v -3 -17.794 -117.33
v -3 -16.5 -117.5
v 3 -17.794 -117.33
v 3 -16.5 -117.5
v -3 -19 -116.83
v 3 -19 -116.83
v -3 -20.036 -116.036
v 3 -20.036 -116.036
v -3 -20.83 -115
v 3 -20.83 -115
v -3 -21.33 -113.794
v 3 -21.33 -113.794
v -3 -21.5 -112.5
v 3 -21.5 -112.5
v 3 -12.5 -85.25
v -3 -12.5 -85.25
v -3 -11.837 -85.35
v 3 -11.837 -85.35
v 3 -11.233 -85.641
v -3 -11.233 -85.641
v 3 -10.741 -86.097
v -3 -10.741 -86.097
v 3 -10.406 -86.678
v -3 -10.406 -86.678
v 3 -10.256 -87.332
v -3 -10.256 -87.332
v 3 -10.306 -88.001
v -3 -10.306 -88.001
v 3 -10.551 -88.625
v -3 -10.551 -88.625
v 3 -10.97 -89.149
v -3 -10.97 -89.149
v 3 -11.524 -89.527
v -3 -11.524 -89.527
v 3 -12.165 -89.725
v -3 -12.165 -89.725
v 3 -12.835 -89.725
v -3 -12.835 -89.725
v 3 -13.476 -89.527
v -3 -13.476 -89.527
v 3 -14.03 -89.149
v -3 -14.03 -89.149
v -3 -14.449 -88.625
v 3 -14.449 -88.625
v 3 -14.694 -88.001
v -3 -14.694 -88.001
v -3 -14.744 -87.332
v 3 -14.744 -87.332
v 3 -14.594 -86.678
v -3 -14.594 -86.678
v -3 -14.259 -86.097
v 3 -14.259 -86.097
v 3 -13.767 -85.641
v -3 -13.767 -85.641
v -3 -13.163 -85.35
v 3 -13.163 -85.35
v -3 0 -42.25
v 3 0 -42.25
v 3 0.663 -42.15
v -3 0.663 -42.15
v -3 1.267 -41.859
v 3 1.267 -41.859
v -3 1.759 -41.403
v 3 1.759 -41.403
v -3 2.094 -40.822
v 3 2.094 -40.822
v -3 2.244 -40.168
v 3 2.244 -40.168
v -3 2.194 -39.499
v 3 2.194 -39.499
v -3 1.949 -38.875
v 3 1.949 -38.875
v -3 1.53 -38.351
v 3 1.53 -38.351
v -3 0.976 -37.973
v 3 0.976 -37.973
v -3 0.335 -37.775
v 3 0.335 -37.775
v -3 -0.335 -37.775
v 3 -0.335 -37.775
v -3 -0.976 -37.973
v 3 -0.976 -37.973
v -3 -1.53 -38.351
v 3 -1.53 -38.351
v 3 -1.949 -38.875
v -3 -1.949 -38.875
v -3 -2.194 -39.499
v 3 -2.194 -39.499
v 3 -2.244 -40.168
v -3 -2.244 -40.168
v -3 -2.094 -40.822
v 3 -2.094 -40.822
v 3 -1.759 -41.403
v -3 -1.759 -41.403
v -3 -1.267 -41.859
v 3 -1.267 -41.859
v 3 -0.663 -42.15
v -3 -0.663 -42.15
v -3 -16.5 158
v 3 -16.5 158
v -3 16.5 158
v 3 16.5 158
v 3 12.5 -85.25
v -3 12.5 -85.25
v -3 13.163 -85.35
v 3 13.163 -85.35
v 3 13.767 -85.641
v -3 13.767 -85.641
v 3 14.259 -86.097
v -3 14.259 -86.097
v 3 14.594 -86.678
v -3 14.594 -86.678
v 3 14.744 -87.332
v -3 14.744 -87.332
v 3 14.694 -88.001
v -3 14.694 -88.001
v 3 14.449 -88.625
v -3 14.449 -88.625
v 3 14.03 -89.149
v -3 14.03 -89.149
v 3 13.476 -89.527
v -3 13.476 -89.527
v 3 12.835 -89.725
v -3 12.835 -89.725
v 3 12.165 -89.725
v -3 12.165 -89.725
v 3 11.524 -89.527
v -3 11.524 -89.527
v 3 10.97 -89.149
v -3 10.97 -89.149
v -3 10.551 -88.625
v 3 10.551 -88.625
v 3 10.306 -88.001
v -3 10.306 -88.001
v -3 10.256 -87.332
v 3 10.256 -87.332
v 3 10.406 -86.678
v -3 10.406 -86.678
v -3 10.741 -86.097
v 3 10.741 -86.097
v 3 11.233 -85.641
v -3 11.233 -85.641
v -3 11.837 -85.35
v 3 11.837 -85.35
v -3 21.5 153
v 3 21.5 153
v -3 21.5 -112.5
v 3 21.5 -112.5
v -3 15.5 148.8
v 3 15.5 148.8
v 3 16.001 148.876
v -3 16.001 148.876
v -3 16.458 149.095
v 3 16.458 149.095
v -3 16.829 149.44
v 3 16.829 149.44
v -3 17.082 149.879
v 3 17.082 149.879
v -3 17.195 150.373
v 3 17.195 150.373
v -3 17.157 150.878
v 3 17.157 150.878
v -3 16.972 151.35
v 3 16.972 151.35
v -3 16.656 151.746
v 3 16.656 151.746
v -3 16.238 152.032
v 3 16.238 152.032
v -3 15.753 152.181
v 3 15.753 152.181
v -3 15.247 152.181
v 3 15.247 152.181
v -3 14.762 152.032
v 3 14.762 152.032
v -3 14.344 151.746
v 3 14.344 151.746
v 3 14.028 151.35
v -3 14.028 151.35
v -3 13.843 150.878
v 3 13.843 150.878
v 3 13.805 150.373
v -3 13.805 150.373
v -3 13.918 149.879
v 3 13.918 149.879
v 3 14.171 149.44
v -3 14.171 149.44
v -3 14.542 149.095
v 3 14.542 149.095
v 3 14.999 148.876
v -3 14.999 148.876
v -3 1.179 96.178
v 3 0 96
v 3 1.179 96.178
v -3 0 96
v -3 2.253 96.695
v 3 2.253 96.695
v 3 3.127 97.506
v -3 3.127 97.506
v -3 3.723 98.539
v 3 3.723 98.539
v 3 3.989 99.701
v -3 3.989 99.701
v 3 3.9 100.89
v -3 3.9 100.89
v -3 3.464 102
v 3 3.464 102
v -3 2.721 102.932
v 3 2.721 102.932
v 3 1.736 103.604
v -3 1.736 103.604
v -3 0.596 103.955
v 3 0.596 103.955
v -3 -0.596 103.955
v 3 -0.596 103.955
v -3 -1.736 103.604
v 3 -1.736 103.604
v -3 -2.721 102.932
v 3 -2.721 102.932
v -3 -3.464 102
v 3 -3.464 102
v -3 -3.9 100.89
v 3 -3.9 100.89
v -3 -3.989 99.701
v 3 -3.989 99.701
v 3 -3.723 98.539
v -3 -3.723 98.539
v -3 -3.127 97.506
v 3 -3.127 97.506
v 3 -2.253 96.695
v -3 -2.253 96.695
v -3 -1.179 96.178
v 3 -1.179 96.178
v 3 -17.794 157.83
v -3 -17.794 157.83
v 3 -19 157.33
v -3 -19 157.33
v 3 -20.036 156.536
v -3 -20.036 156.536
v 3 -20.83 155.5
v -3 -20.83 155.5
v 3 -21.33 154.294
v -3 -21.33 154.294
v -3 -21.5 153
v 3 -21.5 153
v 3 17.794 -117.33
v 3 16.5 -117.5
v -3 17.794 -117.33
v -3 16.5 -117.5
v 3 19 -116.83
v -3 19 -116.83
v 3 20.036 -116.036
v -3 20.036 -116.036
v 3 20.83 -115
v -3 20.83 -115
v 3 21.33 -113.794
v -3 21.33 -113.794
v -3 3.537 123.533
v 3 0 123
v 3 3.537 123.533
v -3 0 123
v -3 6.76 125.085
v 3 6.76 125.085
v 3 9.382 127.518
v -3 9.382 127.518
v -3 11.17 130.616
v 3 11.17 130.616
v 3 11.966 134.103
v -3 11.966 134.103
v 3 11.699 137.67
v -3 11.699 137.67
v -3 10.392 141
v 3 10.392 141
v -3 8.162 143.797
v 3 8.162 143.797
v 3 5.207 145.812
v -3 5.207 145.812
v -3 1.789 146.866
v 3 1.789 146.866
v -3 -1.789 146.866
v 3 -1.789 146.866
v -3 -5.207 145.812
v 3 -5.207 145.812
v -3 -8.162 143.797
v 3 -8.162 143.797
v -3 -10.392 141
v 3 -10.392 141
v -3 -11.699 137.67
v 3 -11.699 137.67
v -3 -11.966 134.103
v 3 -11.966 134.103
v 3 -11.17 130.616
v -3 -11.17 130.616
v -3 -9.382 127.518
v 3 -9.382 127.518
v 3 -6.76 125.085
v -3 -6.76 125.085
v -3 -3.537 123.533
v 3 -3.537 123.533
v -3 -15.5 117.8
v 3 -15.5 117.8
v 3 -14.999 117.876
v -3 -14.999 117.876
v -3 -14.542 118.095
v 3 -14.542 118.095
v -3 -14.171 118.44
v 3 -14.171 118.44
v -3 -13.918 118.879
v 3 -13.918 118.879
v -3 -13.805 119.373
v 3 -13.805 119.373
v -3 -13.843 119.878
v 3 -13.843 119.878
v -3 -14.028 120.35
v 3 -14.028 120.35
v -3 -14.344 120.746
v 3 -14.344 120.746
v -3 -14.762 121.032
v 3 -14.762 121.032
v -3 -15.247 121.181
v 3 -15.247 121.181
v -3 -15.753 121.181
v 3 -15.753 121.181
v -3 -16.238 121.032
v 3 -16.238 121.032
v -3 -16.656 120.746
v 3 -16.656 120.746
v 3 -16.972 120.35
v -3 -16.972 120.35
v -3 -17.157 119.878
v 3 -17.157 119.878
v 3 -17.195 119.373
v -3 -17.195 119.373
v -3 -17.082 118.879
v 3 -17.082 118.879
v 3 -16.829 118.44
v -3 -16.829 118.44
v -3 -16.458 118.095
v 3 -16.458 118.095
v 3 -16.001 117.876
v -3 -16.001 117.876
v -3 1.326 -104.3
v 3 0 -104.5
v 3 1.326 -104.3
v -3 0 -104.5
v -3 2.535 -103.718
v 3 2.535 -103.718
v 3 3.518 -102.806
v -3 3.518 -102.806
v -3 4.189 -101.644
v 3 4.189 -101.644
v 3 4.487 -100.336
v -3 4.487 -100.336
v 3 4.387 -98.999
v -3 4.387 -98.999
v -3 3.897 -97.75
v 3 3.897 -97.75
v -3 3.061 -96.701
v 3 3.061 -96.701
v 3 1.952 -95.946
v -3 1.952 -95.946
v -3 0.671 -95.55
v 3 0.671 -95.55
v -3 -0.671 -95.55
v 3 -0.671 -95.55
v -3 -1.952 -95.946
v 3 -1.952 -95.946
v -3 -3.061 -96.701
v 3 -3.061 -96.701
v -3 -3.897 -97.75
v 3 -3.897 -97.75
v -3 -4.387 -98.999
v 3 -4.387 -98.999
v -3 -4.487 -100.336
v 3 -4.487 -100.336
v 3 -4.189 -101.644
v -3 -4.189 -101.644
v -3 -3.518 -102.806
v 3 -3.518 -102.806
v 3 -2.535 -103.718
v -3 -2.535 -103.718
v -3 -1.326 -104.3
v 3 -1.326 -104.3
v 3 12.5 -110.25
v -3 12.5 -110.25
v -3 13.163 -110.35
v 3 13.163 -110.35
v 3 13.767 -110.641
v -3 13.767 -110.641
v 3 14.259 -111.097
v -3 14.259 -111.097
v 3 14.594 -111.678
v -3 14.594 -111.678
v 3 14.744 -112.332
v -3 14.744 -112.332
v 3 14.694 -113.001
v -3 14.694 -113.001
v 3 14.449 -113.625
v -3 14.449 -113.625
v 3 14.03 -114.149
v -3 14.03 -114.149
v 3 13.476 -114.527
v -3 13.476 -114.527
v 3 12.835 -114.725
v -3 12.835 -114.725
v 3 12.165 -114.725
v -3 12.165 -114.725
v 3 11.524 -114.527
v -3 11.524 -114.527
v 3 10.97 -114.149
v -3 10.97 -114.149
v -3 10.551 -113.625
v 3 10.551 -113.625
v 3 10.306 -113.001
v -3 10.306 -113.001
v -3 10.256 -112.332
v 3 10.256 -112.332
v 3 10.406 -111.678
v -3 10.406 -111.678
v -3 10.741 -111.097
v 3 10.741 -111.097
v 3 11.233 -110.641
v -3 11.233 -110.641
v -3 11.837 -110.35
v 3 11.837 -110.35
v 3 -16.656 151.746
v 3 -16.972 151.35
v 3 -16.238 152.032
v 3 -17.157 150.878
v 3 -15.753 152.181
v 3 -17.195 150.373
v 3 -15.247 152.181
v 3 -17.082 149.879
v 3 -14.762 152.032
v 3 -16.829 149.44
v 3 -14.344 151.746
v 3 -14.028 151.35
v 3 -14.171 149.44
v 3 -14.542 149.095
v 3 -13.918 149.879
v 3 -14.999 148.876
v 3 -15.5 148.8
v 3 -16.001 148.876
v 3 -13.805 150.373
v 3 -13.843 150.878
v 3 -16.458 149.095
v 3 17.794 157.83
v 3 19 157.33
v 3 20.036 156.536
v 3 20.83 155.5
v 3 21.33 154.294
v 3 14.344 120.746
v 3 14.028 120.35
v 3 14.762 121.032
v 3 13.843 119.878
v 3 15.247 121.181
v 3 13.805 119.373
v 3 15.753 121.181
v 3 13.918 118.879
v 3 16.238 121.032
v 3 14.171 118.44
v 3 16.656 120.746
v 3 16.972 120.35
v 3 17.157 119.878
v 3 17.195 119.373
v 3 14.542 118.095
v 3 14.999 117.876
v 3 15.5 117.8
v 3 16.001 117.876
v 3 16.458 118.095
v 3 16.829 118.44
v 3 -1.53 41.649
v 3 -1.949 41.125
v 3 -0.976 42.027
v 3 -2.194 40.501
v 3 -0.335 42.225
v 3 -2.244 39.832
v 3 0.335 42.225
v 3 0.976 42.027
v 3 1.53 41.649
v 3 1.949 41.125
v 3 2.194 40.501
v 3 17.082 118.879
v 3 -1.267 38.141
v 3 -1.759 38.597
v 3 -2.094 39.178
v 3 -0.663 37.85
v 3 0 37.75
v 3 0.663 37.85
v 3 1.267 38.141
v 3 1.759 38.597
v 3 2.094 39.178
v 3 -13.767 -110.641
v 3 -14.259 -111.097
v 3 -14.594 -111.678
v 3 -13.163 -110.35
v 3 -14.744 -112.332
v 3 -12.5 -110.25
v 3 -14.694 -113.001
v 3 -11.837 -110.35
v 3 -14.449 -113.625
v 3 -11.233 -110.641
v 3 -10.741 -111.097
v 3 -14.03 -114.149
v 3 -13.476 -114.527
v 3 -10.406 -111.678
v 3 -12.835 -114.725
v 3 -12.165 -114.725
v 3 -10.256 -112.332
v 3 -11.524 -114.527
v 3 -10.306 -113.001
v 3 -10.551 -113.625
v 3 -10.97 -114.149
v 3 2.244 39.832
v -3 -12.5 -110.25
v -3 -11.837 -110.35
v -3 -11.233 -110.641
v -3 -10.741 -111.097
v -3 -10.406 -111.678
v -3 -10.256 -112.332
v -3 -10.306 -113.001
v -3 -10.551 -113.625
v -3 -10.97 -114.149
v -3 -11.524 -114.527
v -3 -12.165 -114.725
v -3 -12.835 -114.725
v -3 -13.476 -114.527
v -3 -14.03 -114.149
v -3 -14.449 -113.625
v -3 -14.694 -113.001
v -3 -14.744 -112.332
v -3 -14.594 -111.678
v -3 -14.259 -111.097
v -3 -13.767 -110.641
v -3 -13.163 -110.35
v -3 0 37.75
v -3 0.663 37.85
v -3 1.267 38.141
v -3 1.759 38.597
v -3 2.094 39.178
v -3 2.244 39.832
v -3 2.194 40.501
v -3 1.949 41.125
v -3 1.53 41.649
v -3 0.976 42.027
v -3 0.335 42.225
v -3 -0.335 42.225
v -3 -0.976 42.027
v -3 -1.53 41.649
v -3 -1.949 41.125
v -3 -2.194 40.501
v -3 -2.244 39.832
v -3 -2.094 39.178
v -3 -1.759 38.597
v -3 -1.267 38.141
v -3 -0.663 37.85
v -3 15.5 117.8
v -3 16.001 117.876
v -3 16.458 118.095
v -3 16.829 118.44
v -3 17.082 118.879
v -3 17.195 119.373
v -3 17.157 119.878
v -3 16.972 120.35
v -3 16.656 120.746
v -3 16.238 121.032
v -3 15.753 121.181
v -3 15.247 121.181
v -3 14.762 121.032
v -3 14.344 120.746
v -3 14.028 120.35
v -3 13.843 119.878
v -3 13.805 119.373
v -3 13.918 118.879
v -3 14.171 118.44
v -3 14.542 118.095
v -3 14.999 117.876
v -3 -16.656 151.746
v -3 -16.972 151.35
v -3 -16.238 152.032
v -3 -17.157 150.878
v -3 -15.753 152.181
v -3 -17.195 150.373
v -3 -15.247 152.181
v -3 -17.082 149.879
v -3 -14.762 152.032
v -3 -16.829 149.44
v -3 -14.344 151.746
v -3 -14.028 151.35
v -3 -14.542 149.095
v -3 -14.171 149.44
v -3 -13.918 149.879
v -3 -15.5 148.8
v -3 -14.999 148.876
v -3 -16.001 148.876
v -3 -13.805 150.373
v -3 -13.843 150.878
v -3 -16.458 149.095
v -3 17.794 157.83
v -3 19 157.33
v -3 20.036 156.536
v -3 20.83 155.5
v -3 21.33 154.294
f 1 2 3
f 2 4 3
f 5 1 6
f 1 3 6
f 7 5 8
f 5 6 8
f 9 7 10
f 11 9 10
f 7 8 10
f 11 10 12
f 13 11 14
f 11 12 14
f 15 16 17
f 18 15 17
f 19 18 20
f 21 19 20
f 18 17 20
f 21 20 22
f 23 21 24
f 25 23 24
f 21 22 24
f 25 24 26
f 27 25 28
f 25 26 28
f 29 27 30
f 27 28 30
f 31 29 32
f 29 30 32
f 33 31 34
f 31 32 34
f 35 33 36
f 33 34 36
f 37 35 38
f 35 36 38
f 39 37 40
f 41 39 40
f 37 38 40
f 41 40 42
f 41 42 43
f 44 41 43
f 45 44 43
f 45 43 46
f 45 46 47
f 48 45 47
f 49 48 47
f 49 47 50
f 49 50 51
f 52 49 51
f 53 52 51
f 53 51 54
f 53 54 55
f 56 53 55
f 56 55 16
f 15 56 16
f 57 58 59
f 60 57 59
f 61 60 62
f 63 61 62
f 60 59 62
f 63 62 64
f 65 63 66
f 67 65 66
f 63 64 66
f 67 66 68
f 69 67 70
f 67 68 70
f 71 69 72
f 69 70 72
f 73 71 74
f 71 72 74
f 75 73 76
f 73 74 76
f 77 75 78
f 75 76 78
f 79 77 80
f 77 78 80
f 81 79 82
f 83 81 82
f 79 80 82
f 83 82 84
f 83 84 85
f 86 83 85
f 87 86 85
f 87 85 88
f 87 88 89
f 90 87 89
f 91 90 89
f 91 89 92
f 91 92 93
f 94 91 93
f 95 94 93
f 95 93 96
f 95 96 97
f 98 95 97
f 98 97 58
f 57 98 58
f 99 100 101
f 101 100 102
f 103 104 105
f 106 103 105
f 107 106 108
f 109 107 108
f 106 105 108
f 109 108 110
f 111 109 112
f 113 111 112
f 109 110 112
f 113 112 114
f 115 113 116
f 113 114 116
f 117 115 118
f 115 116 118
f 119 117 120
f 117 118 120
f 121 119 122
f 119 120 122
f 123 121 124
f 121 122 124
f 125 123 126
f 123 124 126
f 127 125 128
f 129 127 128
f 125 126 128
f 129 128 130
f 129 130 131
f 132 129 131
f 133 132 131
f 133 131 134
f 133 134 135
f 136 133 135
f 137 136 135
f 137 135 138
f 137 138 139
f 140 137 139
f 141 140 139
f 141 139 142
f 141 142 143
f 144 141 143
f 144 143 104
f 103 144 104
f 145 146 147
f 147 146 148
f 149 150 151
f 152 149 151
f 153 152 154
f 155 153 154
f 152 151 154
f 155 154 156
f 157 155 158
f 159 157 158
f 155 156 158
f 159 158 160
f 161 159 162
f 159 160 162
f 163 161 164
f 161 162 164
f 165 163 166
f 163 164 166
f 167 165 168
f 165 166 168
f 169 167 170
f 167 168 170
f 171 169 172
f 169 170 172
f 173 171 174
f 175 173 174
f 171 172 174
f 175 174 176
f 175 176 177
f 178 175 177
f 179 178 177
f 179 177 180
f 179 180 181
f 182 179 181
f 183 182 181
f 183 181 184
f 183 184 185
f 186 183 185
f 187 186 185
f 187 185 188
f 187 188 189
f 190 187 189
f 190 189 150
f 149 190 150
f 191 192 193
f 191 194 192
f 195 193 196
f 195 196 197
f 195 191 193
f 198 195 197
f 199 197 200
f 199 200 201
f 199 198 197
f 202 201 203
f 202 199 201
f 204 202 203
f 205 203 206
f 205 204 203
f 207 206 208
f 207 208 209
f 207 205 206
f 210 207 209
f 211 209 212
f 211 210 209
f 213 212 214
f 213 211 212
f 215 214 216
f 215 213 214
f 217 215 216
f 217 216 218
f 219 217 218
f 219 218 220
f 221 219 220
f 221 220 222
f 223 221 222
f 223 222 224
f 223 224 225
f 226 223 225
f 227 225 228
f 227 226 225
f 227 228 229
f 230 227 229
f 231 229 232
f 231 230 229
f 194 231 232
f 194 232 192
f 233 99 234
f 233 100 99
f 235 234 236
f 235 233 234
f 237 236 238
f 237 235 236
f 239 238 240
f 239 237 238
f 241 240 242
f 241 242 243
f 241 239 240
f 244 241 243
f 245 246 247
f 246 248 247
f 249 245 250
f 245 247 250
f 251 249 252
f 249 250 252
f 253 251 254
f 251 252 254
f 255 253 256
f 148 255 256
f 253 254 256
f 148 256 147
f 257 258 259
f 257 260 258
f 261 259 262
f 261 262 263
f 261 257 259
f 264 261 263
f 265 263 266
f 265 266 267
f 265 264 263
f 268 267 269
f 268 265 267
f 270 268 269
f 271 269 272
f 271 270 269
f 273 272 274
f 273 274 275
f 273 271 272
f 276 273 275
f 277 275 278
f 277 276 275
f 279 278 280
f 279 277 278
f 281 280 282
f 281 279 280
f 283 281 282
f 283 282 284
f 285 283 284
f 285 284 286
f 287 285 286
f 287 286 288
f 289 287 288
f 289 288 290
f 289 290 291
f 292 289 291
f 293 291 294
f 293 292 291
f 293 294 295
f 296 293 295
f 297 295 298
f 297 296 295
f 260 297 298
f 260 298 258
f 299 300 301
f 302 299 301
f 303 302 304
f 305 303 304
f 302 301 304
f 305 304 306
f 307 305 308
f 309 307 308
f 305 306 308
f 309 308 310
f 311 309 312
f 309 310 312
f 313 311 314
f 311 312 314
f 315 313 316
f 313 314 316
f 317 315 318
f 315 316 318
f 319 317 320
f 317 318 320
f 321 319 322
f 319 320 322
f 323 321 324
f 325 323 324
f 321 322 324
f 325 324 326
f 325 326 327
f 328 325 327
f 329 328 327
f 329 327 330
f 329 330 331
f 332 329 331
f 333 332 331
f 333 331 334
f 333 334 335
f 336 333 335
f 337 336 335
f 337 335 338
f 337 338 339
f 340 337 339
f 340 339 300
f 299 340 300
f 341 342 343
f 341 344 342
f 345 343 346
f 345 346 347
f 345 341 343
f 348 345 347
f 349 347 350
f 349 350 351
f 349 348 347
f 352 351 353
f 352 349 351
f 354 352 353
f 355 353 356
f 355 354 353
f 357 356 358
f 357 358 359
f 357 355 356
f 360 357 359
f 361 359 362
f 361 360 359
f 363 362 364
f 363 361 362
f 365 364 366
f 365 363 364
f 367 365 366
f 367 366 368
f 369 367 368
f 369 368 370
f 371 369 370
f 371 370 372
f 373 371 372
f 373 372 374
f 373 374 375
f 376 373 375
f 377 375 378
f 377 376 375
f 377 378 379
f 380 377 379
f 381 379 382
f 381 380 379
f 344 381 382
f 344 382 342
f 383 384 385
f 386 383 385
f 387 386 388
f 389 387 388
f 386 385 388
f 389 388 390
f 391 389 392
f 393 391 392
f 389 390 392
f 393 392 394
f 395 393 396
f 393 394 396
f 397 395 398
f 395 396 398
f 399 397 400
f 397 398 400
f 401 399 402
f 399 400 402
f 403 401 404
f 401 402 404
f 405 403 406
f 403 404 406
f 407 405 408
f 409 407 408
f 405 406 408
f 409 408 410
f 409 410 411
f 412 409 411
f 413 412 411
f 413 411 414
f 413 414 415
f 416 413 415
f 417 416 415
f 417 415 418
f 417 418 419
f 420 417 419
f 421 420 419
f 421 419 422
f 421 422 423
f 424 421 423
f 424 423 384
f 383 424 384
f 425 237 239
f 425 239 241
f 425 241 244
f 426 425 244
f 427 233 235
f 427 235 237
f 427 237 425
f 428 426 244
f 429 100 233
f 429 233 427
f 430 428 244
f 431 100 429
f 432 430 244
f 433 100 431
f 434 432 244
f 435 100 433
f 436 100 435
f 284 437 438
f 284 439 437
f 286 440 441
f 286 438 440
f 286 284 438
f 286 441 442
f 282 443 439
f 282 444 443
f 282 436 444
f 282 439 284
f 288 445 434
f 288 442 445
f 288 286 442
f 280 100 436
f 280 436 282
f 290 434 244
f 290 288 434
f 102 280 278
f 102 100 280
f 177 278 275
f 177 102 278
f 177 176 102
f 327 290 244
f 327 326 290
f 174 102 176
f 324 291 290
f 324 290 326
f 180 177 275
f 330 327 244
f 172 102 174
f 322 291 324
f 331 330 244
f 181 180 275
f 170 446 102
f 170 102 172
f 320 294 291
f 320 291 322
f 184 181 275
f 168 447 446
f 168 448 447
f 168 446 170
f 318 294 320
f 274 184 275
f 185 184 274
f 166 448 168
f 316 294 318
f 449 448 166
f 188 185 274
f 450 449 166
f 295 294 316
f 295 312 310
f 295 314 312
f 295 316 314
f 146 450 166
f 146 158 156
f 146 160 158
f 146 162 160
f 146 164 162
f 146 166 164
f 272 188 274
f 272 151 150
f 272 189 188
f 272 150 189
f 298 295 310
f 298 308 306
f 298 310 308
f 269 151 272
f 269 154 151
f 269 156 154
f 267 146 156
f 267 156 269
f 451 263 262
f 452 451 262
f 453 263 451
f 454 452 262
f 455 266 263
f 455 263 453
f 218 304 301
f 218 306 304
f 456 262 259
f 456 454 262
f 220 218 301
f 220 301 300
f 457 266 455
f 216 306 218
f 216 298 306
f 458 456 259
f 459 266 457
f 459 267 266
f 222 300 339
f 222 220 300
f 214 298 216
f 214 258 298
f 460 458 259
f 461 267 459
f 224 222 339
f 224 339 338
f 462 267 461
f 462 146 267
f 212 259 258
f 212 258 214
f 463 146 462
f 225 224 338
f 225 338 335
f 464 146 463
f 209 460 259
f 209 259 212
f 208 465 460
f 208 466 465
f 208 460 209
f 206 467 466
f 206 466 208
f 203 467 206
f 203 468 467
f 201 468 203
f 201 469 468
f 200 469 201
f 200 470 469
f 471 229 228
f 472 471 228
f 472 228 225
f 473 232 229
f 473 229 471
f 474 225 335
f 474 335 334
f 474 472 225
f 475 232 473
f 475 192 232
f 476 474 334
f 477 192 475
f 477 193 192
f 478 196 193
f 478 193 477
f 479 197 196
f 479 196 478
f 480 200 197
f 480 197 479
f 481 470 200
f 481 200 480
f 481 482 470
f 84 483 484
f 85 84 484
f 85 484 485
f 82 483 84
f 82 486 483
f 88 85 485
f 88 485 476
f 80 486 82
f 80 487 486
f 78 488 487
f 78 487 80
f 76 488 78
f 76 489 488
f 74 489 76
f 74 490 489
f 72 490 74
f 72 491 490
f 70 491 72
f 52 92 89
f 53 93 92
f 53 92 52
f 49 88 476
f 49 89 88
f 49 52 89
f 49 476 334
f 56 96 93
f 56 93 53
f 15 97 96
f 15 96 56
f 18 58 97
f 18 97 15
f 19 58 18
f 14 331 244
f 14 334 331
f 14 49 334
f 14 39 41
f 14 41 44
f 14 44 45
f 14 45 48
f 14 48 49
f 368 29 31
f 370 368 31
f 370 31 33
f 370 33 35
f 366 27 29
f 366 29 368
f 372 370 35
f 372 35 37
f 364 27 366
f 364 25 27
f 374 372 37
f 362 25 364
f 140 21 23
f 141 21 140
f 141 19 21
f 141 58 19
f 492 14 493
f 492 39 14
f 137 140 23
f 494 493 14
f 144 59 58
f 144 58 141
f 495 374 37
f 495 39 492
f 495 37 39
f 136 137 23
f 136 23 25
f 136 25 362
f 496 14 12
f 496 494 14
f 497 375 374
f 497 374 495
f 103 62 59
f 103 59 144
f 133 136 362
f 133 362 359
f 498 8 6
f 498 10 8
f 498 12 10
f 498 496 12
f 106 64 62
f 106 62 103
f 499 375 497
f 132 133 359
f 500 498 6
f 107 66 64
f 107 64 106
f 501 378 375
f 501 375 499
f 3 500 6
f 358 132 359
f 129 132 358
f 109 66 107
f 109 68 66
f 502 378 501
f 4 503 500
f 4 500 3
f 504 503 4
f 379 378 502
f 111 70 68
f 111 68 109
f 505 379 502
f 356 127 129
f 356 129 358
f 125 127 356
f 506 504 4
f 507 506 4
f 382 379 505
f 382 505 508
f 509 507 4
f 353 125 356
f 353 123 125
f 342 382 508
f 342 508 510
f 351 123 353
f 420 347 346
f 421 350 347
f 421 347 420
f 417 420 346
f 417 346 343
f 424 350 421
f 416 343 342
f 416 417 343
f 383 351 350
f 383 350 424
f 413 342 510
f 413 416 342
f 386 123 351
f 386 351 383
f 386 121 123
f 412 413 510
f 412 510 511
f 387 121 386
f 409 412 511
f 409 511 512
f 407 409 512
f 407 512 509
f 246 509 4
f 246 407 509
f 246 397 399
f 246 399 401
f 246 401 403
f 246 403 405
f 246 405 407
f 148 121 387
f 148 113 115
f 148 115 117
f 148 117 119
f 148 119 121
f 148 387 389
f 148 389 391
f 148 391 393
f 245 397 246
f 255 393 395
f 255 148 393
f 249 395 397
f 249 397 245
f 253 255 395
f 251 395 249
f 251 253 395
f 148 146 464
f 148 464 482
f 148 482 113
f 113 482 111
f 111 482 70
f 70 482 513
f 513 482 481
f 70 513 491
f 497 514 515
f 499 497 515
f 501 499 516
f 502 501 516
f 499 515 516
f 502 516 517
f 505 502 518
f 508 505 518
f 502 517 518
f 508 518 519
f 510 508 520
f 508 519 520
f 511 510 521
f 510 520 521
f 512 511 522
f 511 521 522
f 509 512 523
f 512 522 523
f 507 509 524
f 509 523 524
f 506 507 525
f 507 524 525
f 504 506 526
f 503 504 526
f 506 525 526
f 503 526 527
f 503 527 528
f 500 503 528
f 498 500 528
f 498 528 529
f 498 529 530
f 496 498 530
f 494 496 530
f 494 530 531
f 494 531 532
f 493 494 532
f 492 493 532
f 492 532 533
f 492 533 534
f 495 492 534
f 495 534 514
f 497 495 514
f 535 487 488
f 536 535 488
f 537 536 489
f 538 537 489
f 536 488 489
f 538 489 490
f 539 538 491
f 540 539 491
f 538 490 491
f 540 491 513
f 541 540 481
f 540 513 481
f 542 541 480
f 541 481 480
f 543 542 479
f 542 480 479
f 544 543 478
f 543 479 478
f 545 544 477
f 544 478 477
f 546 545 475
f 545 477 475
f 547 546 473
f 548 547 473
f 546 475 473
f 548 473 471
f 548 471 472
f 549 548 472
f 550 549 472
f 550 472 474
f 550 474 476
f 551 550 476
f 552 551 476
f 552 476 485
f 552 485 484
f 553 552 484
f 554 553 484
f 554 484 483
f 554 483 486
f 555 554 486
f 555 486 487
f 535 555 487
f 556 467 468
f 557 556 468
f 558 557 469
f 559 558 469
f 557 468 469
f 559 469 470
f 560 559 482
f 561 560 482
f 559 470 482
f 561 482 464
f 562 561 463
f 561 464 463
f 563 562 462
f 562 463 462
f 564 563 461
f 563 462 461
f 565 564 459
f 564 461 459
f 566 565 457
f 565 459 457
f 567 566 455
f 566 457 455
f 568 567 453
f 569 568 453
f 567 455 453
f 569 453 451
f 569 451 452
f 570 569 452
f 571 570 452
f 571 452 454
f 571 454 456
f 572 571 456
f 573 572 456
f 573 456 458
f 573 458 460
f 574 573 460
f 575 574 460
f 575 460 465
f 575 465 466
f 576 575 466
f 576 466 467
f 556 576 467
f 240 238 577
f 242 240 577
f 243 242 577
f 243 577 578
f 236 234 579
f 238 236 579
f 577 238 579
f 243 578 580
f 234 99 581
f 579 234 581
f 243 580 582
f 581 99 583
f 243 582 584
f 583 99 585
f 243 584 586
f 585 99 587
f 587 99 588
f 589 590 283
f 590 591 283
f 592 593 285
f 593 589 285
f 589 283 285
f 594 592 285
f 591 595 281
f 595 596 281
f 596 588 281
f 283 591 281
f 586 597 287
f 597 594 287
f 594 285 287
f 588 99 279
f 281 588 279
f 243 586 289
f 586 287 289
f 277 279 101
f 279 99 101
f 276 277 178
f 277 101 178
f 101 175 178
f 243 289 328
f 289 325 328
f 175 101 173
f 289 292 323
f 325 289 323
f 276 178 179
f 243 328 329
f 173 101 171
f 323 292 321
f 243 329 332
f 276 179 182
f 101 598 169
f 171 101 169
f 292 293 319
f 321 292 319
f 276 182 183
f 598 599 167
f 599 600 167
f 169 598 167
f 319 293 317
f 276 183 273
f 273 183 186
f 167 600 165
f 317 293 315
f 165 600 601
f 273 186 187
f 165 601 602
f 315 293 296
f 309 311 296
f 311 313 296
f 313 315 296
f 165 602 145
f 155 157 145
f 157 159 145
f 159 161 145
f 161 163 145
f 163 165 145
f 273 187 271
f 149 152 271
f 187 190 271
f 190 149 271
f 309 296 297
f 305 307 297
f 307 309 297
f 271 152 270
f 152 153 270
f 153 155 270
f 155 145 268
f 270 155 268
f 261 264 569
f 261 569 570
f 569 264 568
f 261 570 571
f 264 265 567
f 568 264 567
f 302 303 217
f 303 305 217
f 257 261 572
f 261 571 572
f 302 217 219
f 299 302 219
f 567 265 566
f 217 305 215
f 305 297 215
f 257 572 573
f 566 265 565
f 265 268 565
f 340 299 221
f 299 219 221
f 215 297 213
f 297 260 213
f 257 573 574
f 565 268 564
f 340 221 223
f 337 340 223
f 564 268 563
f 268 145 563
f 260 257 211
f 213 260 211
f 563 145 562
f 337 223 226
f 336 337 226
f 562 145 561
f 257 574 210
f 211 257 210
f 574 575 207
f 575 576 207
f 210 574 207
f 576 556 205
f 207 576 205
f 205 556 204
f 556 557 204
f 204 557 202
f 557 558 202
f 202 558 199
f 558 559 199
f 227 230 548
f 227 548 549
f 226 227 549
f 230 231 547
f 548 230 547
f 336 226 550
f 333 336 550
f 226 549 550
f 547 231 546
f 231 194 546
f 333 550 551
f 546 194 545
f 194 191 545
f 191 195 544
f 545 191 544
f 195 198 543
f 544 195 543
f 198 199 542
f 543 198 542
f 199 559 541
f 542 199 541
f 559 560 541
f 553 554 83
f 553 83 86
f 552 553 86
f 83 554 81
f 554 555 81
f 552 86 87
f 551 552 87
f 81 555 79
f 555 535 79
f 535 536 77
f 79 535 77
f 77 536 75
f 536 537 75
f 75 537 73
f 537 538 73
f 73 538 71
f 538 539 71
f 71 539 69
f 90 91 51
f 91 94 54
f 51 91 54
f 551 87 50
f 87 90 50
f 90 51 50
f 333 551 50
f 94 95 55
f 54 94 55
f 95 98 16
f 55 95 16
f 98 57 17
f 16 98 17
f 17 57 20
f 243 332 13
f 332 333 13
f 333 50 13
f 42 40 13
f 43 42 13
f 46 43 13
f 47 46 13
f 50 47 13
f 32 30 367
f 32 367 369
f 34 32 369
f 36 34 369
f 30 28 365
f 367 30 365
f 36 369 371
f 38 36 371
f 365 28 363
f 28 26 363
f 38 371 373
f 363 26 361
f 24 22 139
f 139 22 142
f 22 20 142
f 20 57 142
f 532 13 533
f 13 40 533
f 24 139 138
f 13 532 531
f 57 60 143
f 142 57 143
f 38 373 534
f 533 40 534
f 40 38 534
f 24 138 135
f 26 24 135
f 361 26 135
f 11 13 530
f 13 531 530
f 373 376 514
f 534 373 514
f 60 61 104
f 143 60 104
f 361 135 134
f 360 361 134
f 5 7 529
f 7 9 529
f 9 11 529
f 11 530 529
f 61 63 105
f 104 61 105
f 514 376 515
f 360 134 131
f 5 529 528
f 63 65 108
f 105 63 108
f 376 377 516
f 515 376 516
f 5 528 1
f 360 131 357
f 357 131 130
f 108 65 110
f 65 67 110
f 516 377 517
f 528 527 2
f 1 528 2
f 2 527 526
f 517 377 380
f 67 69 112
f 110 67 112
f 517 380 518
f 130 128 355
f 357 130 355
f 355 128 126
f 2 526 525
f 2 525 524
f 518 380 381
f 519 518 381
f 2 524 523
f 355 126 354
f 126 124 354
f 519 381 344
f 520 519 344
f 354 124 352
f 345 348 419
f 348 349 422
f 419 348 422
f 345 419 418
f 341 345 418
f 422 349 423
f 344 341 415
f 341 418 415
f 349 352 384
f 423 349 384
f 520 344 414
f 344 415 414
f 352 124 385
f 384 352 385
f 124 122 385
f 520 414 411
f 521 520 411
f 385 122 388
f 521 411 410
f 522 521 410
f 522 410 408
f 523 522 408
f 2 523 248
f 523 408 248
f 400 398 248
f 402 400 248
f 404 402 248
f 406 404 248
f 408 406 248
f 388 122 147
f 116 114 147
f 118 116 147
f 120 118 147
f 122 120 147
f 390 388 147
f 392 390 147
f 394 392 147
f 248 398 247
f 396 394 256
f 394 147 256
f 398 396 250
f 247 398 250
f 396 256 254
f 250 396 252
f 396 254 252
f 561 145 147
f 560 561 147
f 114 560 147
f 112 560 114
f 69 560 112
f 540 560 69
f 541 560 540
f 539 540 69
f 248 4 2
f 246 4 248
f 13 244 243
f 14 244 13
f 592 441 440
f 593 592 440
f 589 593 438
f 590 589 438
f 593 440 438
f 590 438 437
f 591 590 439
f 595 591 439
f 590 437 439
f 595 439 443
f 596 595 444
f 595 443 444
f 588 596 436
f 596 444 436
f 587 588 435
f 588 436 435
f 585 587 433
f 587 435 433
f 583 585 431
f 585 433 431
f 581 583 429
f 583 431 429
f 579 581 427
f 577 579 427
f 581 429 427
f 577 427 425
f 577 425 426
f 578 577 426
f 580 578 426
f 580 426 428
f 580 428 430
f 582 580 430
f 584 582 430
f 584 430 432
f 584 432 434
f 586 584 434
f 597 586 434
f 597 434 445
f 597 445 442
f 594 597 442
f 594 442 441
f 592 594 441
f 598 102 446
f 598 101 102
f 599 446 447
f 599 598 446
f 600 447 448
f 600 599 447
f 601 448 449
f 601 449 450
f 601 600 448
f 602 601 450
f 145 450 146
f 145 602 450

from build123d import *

# Parameters (mm, degrees)
CROQUIS2_W                   = 275.5
CROQUIS2_H                   = 43
CROQUIS2_R                   = 4
CROQUIS2_R_2                 = 4.5
CROQUIS2_R_3                 = 12
SALIENTE_EXTRUIR1_DEPTH      = 3
REDONDEO1_R                  = 5
TALADRO_DE_MARGEN_PARA_M41_D = 4.5
TALADRO_DE_MARGEN_PARA_M31_D = 3.4
TALADRO_DE_MARGEN_PARA_M42_D = 4.5


with BuildPart() as part:
    # Croquis2 → Saliente-Extruir1 (new, symmetric)
    with BuildSketch(Plane(origin=(0, 0, 0), x_dir=(0, 0, -1), z_dir=(1, 0, 0))):
        with Locations((-20.25, 0)):
            Rectangle(CROQUIS2_W, CROQUIS2_H)
        with Locations((-100, 0)):
            Circle(CROQUIS2_R, mode=Mode.SUBTRACT)
        with Locations((100, 0)):
            Circle(CROQUIS2_R_2, mode=Mode.SUBTRACT)
        with Locations((-135, 0)):
            Circle(CROQUIS2_R_3, mode=Mode.SUBTRACT)
    extrude(amount=SALIENTE_EXTRUIR1_DEPTH, both=True)

    # Redondeo1
    redondeo1_edges = [part.edges().sort_by_distance(p)[0] for p in [
        (0, 21.5, 158),
        (0, 21.5, -117.5),
        (0, -21.5, -117.5),
        (0, -21.5, 158),
    ]]
    fillet(redondeo1_edges, radius=REDONDEO1_R)

    # Taladro de margen para M41 (through all)
    with Locations(Plane(origin=(3, 0, 0), x_dir=(0, 0, -1), z_dir=(1, 0, 0))):
        with Locations((112.5, 12.5), (112.5, -12.5), (87.5, -12.5), (87.5, 12.5)):
            Hole(TALADRO_DE_MARGEN_PARA_M41_D / 2)

    # Taladro de margen para M31 (through all)
    with Locations(Plane.ZY.offset(3)):
        with Locations((150.5, 15.5), (119.5, 15.5), (119.5, -15.5), (150.5, -15.5)):
            Hole(TALADRO_DE_MARGEN_PARA_M31_D / 2)

    # Taladro de margen para M42 (through all)
    with Locations(Plane.ZY.offset(3)):
        with Locations((-40, 0), (40, 0)):
            Hole(TALADRO_DE_MARGEN_PARA_M42_D / 2)


solid = part.part
